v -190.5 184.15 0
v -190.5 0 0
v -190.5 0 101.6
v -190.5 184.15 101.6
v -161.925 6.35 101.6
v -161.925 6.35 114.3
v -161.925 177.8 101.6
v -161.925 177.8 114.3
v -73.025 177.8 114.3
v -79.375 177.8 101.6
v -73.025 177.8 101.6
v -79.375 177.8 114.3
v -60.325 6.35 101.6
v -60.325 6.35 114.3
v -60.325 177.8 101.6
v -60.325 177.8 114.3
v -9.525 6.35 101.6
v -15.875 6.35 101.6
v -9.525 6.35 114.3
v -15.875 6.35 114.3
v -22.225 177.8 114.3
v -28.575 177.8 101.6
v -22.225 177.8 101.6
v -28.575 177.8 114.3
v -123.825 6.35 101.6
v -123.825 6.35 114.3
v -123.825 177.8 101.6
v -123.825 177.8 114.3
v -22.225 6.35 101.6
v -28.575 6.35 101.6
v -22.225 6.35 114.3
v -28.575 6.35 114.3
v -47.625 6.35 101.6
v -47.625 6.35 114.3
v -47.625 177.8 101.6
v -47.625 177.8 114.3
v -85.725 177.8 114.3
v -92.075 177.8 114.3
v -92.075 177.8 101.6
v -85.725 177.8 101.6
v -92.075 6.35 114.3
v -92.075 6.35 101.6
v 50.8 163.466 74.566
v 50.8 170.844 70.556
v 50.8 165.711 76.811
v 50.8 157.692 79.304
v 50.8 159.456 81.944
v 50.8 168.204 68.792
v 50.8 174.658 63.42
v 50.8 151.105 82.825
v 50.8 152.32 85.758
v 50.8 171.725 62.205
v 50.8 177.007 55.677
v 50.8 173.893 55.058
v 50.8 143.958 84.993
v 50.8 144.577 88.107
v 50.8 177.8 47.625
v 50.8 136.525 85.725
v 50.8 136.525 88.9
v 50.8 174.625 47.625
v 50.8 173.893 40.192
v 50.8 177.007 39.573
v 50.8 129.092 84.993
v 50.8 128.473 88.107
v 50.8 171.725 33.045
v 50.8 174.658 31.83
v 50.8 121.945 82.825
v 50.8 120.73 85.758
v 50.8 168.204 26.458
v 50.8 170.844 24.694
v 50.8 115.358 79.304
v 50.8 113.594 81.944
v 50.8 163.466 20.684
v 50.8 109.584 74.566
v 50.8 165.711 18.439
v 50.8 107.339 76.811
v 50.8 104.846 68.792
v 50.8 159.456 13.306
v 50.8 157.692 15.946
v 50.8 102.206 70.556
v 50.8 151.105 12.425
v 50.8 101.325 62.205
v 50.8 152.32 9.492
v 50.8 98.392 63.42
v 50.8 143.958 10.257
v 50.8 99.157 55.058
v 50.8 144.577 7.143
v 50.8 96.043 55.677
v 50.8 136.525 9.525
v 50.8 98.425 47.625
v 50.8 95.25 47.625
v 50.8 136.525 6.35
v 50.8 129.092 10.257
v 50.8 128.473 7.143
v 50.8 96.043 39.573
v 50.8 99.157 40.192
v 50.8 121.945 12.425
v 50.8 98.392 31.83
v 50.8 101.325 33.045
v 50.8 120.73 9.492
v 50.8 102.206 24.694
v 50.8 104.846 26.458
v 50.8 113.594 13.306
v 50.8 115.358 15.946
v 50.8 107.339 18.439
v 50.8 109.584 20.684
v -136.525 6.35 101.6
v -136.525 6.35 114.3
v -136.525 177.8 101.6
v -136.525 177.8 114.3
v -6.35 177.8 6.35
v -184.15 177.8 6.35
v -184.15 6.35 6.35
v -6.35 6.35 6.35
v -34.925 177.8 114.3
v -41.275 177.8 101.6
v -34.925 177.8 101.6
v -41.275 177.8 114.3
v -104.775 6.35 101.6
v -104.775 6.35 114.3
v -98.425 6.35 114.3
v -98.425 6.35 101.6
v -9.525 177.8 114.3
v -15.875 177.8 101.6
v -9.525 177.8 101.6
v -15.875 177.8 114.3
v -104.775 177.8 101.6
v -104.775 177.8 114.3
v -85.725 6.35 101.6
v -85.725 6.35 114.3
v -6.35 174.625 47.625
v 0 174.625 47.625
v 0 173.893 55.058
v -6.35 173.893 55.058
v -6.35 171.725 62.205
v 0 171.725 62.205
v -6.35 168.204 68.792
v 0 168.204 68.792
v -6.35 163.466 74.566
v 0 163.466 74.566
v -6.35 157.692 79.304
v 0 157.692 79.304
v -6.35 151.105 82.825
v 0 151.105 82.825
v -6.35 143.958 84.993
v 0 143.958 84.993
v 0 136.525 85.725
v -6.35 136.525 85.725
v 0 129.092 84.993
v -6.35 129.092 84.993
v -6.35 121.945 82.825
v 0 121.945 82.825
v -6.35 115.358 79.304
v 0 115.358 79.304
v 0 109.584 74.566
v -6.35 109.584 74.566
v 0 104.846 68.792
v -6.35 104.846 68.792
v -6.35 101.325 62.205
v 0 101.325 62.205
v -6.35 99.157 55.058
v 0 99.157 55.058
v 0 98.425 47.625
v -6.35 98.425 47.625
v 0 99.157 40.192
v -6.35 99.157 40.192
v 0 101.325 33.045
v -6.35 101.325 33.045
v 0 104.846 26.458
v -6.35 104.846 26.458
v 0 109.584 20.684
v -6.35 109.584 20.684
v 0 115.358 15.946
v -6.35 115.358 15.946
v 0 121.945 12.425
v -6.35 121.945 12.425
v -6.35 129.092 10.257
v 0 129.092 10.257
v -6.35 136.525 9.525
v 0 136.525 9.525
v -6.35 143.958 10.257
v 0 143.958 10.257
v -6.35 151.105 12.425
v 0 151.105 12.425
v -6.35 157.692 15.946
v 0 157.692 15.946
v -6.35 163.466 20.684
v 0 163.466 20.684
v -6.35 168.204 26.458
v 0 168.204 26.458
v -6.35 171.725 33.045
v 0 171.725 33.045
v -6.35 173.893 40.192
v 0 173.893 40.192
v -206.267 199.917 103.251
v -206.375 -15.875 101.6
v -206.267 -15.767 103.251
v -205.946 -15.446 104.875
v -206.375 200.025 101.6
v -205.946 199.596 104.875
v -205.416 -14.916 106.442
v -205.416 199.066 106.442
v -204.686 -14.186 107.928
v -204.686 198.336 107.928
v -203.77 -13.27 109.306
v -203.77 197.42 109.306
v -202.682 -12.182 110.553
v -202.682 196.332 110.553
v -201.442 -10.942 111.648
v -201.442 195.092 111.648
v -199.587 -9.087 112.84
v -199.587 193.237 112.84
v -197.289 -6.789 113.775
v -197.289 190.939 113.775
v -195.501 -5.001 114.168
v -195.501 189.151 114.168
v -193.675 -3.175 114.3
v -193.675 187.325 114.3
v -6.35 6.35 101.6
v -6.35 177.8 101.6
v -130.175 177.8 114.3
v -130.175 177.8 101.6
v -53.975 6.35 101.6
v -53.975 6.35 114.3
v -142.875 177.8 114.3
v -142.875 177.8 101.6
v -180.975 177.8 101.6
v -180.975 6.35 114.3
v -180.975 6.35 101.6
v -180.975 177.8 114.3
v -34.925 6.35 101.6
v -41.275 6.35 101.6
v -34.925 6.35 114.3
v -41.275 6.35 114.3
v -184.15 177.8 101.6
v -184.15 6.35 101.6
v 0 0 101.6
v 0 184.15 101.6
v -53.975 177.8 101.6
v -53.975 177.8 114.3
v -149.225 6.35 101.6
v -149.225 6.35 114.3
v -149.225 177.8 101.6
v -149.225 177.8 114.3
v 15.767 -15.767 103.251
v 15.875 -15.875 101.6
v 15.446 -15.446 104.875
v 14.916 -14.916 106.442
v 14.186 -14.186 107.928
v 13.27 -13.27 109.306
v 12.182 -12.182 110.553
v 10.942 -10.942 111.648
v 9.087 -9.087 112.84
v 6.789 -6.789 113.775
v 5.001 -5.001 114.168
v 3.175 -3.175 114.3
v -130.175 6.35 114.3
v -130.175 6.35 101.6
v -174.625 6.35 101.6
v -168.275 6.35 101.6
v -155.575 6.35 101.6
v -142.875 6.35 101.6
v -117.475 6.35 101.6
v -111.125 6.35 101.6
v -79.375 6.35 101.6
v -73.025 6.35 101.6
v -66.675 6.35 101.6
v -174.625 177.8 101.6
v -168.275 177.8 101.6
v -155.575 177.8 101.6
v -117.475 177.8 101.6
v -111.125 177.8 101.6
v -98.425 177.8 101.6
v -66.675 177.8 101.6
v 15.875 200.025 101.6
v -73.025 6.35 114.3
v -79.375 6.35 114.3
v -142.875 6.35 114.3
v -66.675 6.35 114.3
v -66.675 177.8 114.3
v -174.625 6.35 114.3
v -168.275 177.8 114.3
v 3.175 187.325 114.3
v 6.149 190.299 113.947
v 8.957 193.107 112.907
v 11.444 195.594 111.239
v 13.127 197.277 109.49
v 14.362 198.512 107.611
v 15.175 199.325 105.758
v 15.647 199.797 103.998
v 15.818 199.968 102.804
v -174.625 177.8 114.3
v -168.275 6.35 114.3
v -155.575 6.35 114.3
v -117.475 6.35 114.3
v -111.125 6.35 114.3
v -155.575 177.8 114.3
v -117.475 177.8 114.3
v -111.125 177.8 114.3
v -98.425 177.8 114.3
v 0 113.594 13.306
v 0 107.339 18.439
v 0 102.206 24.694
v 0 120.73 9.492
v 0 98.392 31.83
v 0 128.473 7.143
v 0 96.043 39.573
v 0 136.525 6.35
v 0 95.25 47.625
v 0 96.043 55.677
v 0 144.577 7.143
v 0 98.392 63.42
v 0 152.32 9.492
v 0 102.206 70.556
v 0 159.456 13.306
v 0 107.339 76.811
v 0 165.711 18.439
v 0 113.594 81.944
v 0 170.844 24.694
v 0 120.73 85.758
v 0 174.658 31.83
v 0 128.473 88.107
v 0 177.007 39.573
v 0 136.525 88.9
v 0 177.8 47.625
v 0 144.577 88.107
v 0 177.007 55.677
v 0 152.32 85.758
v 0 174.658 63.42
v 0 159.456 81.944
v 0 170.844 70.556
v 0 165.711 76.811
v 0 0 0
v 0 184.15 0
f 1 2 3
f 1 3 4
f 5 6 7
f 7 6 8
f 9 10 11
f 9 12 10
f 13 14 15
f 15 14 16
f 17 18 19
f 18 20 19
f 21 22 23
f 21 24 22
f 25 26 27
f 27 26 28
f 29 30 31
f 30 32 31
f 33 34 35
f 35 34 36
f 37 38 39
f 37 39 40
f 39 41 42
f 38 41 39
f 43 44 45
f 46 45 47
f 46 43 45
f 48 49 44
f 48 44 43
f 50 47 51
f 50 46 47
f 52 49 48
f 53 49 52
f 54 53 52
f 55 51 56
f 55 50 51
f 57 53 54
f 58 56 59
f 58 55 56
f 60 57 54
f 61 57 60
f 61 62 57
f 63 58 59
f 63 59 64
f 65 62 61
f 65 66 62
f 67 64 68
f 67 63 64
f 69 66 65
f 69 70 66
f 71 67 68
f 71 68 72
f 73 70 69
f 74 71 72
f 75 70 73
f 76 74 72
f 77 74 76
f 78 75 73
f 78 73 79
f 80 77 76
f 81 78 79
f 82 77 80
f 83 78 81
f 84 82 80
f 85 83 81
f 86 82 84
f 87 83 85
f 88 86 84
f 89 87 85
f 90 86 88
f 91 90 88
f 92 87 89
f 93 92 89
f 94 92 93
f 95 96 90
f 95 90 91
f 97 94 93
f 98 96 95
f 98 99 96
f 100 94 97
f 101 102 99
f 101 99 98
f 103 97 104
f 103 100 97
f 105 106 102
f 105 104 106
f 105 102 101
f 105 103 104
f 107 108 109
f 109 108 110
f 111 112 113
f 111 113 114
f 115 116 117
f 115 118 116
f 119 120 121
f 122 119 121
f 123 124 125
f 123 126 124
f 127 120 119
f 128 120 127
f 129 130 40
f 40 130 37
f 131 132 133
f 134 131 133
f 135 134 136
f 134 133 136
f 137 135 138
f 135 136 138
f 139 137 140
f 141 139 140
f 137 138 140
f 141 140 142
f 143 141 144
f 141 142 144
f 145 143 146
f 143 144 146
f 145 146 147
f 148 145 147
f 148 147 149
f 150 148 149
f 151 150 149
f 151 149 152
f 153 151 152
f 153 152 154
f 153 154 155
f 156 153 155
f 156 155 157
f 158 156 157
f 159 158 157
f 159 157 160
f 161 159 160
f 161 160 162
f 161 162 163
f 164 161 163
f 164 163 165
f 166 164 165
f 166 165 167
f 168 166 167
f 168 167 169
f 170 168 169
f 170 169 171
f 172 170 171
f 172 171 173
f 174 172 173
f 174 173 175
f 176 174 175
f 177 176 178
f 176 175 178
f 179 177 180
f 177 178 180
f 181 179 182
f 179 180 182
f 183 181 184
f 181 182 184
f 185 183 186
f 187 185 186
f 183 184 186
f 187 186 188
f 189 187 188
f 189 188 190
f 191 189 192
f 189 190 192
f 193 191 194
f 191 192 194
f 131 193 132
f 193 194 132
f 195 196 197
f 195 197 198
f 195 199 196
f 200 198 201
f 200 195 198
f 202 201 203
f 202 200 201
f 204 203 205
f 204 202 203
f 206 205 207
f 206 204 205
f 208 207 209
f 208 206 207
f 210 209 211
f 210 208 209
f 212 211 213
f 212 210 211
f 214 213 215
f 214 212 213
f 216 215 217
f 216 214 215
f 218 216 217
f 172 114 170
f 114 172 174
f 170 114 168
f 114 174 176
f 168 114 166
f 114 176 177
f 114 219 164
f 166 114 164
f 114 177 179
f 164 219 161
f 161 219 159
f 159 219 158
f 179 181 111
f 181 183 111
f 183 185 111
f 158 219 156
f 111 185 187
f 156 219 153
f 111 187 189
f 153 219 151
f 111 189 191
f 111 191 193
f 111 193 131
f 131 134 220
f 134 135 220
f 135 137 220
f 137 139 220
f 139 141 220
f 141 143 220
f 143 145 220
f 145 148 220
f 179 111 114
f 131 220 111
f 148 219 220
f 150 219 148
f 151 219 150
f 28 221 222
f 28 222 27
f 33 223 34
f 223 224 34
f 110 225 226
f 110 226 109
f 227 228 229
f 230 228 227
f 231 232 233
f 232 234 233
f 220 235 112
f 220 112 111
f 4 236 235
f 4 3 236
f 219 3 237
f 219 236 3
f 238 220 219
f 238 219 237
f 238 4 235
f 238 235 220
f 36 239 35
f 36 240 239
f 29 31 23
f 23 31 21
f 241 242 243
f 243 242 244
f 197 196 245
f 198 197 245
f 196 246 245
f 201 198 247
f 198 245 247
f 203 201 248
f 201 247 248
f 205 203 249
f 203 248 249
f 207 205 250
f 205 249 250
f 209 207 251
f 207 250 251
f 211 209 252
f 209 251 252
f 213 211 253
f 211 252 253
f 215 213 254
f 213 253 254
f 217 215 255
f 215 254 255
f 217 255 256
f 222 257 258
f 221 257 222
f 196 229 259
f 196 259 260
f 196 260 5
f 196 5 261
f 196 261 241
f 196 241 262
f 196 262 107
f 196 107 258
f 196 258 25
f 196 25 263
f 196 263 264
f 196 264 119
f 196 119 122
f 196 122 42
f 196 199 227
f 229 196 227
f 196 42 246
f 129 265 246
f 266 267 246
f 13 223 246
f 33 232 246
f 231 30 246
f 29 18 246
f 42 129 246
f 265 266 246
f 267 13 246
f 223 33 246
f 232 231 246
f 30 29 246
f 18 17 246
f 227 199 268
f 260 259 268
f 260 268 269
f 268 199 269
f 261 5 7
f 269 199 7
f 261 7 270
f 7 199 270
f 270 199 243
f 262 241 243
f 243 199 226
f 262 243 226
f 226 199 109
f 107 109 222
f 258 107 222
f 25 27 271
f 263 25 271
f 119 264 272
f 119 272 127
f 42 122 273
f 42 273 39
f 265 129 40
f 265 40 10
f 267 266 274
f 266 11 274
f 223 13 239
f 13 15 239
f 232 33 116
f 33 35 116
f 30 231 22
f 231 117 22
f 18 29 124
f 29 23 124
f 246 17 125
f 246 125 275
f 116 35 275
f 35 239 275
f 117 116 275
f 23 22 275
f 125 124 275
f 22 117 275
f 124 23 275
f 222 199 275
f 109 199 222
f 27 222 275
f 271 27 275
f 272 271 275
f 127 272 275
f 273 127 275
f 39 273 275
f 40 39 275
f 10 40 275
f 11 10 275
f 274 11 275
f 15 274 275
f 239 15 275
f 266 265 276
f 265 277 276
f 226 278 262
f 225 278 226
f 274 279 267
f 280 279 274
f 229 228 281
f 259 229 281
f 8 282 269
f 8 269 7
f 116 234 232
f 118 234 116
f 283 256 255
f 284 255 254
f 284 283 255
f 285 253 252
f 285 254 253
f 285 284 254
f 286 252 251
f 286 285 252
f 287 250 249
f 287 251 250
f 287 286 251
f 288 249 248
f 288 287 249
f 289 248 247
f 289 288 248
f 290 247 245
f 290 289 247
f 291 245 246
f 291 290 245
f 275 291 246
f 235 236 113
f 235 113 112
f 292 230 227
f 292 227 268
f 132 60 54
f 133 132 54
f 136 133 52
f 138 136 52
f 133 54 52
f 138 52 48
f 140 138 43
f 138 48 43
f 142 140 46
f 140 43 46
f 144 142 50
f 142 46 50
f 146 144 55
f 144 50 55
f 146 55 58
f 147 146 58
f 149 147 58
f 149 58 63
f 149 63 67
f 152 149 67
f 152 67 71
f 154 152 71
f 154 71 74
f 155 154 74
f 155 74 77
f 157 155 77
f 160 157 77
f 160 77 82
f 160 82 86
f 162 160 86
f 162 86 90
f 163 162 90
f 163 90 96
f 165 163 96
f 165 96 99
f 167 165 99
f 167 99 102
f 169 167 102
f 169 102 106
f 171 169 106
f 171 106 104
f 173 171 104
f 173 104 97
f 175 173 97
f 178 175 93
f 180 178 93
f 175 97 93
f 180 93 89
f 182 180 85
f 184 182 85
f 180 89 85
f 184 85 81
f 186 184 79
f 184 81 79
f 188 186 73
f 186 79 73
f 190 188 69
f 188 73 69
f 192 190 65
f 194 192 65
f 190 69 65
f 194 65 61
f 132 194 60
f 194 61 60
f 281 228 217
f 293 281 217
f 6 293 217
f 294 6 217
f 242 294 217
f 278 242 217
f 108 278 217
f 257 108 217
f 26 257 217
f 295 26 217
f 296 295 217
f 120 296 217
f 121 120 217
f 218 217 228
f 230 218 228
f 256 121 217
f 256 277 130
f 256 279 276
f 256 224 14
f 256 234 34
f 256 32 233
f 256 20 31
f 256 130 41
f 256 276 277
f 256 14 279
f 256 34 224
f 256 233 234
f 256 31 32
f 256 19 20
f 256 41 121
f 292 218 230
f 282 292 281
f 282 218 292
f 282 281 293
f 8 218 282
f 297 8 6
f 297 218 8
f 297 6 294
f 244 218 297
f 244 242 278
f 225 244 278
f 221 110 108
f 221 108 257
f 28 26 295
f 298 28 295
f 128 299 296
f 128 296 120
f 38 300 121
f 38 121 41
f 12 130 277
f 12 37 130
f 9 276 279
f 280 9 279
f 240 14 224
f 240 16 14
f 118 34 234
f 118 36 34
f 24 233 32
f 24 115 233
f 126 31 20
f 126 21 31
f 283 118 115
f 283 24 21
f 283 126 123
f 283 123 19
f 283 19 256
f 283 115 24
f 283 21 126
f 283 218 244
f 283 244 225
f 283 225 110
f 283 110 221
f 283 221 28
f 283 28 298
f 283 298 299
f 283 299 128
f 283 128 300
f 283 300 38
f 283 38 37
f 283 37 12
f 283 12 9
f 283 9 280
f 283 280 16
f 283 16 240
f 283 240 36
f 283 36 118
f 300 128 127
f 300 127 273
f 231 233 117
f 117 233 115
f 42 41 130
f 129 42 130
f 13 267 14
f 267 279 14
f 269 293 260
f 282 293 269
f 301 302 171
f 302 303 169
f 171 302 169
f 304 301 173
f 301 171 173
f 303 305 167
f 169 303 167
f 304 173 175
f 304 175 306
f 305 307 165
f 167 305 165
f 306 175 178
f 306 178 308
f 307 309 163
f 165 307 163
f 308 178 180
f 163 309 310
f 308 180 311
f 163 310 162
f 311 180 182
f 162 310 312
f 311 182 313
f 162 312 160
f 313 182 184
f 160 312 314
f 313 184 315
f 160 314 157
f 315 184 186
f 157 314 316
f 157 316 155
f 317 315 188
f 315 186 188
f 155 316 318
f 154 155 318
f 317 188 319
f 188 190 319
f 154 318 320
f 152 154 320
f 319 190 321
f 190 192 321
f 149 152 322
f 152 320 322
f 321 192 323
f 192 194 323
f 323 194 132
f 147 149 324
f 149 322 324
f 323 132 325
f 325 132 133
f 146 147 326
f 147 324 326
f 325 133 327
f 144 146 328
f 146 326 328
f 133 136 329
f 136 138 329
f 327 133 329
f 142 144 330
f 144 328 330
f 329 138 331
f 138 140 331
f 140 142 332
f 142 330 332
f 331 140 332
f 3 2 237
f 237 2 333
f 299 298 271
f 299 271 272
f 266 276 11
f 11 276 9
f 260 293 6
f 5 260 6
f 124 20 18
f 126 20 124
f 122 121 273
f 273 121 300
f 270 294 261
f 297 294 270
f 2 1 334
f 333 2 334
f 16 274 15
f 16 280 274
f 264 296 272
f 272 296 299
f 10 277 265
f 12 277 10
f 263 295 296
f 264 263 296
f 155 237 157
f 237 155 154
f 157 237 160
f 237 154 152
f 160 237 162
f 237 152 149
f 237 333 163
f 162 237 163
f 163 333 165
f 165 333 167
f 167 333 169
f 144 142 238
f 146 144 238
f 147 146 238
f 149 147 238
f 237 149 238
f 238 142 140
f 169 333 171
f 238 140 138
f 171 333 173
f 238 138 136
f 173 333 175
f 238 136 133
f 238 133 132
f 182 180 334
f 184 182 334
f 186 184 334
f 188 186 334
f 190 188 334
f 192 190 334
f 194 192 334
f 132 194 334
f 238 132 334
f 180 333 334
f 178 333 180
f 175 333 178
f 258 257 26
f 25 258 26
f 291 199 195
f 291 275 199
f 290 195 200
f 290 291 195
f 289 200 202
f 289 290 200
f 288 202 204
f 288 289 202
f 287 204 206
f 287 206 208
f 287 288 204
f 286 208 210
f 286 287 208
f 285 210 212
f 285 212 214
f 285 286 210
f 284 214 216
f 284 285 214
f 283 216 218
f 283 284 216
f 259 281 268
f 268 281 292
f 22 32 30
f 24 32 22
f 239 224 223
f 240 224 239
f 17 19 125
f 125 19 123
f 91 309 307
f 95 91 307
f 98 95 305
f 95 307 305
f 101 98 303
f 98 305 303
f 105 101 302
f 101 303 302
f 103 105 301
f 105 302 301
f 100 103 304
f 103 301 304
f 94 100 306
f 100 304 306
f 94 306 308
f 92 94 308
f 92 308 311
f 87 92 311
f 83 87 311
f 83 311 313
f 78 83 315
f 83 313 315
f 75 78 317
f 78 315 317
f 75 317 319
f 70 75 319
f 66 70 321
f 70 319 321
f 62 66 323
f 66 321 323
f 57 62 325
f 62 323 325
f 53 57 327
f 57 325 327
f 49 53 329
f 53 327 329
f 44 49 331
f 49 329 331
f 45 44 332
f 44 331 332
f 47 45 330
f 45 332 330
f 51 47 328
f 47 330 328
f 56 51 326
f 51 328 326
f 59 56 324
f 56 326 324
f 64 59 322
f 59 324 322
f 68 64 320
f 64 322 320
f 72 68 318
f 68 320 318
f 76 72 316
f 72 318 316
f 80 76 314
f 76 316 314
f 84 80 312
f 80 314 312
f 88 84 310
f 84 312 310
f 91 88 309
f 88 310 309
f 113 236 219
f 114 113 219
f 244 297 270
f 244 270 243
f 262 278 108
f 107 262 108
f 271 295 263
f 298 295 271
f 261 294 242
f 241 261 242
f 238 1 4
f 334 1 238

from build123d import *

# Parameters (mm, degrees)
SKETCH2_W          = 190.5
SKETCH2_H          = 184.15
HOUSING_DEPTH      = 101.6
SKETCH4_W          = 177.8
SKETCH4_H          = 171.45
CUT_EXTRUDE1_DEPTH = 95.25
SKETCH6_W          = 222.25
SKETCH6_H          = 215.9
GRILL_DEPTH        = 12.7
CUT_EXTRUDE2_REACH = 311.298
SKETCH7_W          = 6.35
SKETCH7_H          = 171.45
CUT_EXTRUDE3_REACH = 311.298
SKETCH8_W          = 6.35
SKETCH8_H          = 171.45
LPATTERN2_COUNT    = 13
LPATTERN2_PITCH    = 12.7
FILLET1_R          = 12.7
SKETCH9_R          = 41.275
DUCT_DEPTH         = 50.8
SKETCH10_R         = 38.1
CUT_EXTRUDE4_DEPTH = 57.15


# Read off the part's stored shape, not the designer's step: Split1, Split4
with BuildPart() as part:
    # Sketch2 → Housing (new body)
    with BuildSketch(Plane.XY):
        with Locations((-95.25, 92.075)):
            Rectangle(SKETCH2_W, SKETCH2_H)
    extrude(amount=HOUSING_DEPTH)

    # Sketch4 → Cut-Extrude1 (cut)
    with BuildSketch(Plane.XY.offset(101.6)):
        with Locations((-95.25, 92.075)):
            Rectangle(SKETCH4_W, SKETCH4_H)
    extrude(amount=-CUT_EXTRUDE1_DEPTH, mode=Mode.SUBTRACT)

    # Sketch6 → Grill (add)
    with BuildSketch(Plane.XY.offset(101.6)):
        with Locations((-95.25, 92.075)):
            Rectangle(SKETCH6_W, SKETCH6_H)
    extrude(amount=GRILL_DEPTH)

    # Sketch7 → Cut-Extrude2 (cut, up to next)
    with BuildSketch(Plane.XY.offset(114.3), mode=Mode.PRIVATE) as cut_extrude2_sk1:
        with Locations((-177.8, 92.075)):
            Rectangle(SKETCH7_W, SKETCH7_H)
    cut_extrude2_tool1 = extrude(cut_extrude2_sk1.sketch, amount=-CUT_EXTRUDE2_REACH, mode=Mode.PRIVATE) & part.part
    add(cut_extrude2_tool1.solids().sort_by_distance((-177.8, 92.075, 114.3))[0], mode=Mode.SUBTRACT)

    # Sketch8 → Cut-Extrude3 (cut, up to next)
    with BuildSketch(Plane.XY.offset(114.3), mode=Mode.PRIVATE) as cut_extrude3_sk1:
        with Locations((-165.1, 92.075)):
            Rectangle(SKETCH8_W, SKETCH8_H)
    cut_extrude3_tool1 = extrude(cut_extrude3_sk1.sketch, amount=-CUT_EXTRUDE3_REACH, mode=Mode.PRIVATE) & part.part
    cut_extrude3 = cut_extrude3_tool1.solids().sort_by_distance((-165.1, 92.075, 114.3))[0]
    add(cut_extrude3, mode=Mode.SUBTRACT)

    # LPattern2: Cut-Extrude3 ×13
    with Locations(*[(i * LPATTERN2_PITCH, 0, 0) for i in range(1, LPATTERN2_COUNT)]):
        add(cut_extrude3, mode=Mode.SUBTRACT)

    # Fillet1
    fillet1_edges = [part.edges().sort_by_distance(p)[0] for p in [
        (-206.375, 92.075, 114.3),
        (-95.25, -15.875, 114.3),
        (15.875, 92.075, 114.3),
        (-95.25, 200.025, 114.3),
    ]]
    fillet(fillet1_edges, radius=FILLET1_R - 0.0001)  # a hair under: the kernel refuses the full size


with BuildPart() as body_2:
    # Split1: the piece on the far side of the plane
    add(part.part)
    split(bisect_by=Plane.XY.offset(101.6), keep=Keep.BOTTOM)

    # Sketch9 → Duct (add)
    with BuildSketch(Plane(origin=(0, 0, 0), x_dir=(0, 0, -1), z_dir=(1, 0, 0))):
        with Locations(Location((-47.625, 136.525, 0), (0, 0, 270))):
            Circle(SKETCH9_R)
    extrude(amount=DUCT_DEPTH)

    # Sketch10 → Cut-Extrude4 (cut)
    with BuildSketch(Plane(origin=(50.8, 0, 0), x_dir=(0, 0, -1), z_dir=(1, 0, 0))):
        with Locations(Location((-47.625, 136.525, 0), (0, 0, 90))):
            Circle(SKETCH10_R)
    extrude(amount=-CUT_EXTRUDE4_DEPTH, mode=Mode.SUBTRACT)


with BuildPart() as part_1:
    add(part.part)

    # Split1
    split(bisect_by=Plane.XY.offset(101.6), keep=Keep.TOP)


with BuildPart() as body_3:
    # Split4: the piece on the far side of the plane
    add(body_2.part)
    split(bisect_by=Plane.YZ, keep=Keep.BOTTOM)


with BuildPart() as body_2_1:
    add(body_2.part)

    # Split4
    split(bisect_by=Plane.YZ, keep=Keep.TOP)


solid = Compound([part_1.part, body_3.part, body_2_1.part])
